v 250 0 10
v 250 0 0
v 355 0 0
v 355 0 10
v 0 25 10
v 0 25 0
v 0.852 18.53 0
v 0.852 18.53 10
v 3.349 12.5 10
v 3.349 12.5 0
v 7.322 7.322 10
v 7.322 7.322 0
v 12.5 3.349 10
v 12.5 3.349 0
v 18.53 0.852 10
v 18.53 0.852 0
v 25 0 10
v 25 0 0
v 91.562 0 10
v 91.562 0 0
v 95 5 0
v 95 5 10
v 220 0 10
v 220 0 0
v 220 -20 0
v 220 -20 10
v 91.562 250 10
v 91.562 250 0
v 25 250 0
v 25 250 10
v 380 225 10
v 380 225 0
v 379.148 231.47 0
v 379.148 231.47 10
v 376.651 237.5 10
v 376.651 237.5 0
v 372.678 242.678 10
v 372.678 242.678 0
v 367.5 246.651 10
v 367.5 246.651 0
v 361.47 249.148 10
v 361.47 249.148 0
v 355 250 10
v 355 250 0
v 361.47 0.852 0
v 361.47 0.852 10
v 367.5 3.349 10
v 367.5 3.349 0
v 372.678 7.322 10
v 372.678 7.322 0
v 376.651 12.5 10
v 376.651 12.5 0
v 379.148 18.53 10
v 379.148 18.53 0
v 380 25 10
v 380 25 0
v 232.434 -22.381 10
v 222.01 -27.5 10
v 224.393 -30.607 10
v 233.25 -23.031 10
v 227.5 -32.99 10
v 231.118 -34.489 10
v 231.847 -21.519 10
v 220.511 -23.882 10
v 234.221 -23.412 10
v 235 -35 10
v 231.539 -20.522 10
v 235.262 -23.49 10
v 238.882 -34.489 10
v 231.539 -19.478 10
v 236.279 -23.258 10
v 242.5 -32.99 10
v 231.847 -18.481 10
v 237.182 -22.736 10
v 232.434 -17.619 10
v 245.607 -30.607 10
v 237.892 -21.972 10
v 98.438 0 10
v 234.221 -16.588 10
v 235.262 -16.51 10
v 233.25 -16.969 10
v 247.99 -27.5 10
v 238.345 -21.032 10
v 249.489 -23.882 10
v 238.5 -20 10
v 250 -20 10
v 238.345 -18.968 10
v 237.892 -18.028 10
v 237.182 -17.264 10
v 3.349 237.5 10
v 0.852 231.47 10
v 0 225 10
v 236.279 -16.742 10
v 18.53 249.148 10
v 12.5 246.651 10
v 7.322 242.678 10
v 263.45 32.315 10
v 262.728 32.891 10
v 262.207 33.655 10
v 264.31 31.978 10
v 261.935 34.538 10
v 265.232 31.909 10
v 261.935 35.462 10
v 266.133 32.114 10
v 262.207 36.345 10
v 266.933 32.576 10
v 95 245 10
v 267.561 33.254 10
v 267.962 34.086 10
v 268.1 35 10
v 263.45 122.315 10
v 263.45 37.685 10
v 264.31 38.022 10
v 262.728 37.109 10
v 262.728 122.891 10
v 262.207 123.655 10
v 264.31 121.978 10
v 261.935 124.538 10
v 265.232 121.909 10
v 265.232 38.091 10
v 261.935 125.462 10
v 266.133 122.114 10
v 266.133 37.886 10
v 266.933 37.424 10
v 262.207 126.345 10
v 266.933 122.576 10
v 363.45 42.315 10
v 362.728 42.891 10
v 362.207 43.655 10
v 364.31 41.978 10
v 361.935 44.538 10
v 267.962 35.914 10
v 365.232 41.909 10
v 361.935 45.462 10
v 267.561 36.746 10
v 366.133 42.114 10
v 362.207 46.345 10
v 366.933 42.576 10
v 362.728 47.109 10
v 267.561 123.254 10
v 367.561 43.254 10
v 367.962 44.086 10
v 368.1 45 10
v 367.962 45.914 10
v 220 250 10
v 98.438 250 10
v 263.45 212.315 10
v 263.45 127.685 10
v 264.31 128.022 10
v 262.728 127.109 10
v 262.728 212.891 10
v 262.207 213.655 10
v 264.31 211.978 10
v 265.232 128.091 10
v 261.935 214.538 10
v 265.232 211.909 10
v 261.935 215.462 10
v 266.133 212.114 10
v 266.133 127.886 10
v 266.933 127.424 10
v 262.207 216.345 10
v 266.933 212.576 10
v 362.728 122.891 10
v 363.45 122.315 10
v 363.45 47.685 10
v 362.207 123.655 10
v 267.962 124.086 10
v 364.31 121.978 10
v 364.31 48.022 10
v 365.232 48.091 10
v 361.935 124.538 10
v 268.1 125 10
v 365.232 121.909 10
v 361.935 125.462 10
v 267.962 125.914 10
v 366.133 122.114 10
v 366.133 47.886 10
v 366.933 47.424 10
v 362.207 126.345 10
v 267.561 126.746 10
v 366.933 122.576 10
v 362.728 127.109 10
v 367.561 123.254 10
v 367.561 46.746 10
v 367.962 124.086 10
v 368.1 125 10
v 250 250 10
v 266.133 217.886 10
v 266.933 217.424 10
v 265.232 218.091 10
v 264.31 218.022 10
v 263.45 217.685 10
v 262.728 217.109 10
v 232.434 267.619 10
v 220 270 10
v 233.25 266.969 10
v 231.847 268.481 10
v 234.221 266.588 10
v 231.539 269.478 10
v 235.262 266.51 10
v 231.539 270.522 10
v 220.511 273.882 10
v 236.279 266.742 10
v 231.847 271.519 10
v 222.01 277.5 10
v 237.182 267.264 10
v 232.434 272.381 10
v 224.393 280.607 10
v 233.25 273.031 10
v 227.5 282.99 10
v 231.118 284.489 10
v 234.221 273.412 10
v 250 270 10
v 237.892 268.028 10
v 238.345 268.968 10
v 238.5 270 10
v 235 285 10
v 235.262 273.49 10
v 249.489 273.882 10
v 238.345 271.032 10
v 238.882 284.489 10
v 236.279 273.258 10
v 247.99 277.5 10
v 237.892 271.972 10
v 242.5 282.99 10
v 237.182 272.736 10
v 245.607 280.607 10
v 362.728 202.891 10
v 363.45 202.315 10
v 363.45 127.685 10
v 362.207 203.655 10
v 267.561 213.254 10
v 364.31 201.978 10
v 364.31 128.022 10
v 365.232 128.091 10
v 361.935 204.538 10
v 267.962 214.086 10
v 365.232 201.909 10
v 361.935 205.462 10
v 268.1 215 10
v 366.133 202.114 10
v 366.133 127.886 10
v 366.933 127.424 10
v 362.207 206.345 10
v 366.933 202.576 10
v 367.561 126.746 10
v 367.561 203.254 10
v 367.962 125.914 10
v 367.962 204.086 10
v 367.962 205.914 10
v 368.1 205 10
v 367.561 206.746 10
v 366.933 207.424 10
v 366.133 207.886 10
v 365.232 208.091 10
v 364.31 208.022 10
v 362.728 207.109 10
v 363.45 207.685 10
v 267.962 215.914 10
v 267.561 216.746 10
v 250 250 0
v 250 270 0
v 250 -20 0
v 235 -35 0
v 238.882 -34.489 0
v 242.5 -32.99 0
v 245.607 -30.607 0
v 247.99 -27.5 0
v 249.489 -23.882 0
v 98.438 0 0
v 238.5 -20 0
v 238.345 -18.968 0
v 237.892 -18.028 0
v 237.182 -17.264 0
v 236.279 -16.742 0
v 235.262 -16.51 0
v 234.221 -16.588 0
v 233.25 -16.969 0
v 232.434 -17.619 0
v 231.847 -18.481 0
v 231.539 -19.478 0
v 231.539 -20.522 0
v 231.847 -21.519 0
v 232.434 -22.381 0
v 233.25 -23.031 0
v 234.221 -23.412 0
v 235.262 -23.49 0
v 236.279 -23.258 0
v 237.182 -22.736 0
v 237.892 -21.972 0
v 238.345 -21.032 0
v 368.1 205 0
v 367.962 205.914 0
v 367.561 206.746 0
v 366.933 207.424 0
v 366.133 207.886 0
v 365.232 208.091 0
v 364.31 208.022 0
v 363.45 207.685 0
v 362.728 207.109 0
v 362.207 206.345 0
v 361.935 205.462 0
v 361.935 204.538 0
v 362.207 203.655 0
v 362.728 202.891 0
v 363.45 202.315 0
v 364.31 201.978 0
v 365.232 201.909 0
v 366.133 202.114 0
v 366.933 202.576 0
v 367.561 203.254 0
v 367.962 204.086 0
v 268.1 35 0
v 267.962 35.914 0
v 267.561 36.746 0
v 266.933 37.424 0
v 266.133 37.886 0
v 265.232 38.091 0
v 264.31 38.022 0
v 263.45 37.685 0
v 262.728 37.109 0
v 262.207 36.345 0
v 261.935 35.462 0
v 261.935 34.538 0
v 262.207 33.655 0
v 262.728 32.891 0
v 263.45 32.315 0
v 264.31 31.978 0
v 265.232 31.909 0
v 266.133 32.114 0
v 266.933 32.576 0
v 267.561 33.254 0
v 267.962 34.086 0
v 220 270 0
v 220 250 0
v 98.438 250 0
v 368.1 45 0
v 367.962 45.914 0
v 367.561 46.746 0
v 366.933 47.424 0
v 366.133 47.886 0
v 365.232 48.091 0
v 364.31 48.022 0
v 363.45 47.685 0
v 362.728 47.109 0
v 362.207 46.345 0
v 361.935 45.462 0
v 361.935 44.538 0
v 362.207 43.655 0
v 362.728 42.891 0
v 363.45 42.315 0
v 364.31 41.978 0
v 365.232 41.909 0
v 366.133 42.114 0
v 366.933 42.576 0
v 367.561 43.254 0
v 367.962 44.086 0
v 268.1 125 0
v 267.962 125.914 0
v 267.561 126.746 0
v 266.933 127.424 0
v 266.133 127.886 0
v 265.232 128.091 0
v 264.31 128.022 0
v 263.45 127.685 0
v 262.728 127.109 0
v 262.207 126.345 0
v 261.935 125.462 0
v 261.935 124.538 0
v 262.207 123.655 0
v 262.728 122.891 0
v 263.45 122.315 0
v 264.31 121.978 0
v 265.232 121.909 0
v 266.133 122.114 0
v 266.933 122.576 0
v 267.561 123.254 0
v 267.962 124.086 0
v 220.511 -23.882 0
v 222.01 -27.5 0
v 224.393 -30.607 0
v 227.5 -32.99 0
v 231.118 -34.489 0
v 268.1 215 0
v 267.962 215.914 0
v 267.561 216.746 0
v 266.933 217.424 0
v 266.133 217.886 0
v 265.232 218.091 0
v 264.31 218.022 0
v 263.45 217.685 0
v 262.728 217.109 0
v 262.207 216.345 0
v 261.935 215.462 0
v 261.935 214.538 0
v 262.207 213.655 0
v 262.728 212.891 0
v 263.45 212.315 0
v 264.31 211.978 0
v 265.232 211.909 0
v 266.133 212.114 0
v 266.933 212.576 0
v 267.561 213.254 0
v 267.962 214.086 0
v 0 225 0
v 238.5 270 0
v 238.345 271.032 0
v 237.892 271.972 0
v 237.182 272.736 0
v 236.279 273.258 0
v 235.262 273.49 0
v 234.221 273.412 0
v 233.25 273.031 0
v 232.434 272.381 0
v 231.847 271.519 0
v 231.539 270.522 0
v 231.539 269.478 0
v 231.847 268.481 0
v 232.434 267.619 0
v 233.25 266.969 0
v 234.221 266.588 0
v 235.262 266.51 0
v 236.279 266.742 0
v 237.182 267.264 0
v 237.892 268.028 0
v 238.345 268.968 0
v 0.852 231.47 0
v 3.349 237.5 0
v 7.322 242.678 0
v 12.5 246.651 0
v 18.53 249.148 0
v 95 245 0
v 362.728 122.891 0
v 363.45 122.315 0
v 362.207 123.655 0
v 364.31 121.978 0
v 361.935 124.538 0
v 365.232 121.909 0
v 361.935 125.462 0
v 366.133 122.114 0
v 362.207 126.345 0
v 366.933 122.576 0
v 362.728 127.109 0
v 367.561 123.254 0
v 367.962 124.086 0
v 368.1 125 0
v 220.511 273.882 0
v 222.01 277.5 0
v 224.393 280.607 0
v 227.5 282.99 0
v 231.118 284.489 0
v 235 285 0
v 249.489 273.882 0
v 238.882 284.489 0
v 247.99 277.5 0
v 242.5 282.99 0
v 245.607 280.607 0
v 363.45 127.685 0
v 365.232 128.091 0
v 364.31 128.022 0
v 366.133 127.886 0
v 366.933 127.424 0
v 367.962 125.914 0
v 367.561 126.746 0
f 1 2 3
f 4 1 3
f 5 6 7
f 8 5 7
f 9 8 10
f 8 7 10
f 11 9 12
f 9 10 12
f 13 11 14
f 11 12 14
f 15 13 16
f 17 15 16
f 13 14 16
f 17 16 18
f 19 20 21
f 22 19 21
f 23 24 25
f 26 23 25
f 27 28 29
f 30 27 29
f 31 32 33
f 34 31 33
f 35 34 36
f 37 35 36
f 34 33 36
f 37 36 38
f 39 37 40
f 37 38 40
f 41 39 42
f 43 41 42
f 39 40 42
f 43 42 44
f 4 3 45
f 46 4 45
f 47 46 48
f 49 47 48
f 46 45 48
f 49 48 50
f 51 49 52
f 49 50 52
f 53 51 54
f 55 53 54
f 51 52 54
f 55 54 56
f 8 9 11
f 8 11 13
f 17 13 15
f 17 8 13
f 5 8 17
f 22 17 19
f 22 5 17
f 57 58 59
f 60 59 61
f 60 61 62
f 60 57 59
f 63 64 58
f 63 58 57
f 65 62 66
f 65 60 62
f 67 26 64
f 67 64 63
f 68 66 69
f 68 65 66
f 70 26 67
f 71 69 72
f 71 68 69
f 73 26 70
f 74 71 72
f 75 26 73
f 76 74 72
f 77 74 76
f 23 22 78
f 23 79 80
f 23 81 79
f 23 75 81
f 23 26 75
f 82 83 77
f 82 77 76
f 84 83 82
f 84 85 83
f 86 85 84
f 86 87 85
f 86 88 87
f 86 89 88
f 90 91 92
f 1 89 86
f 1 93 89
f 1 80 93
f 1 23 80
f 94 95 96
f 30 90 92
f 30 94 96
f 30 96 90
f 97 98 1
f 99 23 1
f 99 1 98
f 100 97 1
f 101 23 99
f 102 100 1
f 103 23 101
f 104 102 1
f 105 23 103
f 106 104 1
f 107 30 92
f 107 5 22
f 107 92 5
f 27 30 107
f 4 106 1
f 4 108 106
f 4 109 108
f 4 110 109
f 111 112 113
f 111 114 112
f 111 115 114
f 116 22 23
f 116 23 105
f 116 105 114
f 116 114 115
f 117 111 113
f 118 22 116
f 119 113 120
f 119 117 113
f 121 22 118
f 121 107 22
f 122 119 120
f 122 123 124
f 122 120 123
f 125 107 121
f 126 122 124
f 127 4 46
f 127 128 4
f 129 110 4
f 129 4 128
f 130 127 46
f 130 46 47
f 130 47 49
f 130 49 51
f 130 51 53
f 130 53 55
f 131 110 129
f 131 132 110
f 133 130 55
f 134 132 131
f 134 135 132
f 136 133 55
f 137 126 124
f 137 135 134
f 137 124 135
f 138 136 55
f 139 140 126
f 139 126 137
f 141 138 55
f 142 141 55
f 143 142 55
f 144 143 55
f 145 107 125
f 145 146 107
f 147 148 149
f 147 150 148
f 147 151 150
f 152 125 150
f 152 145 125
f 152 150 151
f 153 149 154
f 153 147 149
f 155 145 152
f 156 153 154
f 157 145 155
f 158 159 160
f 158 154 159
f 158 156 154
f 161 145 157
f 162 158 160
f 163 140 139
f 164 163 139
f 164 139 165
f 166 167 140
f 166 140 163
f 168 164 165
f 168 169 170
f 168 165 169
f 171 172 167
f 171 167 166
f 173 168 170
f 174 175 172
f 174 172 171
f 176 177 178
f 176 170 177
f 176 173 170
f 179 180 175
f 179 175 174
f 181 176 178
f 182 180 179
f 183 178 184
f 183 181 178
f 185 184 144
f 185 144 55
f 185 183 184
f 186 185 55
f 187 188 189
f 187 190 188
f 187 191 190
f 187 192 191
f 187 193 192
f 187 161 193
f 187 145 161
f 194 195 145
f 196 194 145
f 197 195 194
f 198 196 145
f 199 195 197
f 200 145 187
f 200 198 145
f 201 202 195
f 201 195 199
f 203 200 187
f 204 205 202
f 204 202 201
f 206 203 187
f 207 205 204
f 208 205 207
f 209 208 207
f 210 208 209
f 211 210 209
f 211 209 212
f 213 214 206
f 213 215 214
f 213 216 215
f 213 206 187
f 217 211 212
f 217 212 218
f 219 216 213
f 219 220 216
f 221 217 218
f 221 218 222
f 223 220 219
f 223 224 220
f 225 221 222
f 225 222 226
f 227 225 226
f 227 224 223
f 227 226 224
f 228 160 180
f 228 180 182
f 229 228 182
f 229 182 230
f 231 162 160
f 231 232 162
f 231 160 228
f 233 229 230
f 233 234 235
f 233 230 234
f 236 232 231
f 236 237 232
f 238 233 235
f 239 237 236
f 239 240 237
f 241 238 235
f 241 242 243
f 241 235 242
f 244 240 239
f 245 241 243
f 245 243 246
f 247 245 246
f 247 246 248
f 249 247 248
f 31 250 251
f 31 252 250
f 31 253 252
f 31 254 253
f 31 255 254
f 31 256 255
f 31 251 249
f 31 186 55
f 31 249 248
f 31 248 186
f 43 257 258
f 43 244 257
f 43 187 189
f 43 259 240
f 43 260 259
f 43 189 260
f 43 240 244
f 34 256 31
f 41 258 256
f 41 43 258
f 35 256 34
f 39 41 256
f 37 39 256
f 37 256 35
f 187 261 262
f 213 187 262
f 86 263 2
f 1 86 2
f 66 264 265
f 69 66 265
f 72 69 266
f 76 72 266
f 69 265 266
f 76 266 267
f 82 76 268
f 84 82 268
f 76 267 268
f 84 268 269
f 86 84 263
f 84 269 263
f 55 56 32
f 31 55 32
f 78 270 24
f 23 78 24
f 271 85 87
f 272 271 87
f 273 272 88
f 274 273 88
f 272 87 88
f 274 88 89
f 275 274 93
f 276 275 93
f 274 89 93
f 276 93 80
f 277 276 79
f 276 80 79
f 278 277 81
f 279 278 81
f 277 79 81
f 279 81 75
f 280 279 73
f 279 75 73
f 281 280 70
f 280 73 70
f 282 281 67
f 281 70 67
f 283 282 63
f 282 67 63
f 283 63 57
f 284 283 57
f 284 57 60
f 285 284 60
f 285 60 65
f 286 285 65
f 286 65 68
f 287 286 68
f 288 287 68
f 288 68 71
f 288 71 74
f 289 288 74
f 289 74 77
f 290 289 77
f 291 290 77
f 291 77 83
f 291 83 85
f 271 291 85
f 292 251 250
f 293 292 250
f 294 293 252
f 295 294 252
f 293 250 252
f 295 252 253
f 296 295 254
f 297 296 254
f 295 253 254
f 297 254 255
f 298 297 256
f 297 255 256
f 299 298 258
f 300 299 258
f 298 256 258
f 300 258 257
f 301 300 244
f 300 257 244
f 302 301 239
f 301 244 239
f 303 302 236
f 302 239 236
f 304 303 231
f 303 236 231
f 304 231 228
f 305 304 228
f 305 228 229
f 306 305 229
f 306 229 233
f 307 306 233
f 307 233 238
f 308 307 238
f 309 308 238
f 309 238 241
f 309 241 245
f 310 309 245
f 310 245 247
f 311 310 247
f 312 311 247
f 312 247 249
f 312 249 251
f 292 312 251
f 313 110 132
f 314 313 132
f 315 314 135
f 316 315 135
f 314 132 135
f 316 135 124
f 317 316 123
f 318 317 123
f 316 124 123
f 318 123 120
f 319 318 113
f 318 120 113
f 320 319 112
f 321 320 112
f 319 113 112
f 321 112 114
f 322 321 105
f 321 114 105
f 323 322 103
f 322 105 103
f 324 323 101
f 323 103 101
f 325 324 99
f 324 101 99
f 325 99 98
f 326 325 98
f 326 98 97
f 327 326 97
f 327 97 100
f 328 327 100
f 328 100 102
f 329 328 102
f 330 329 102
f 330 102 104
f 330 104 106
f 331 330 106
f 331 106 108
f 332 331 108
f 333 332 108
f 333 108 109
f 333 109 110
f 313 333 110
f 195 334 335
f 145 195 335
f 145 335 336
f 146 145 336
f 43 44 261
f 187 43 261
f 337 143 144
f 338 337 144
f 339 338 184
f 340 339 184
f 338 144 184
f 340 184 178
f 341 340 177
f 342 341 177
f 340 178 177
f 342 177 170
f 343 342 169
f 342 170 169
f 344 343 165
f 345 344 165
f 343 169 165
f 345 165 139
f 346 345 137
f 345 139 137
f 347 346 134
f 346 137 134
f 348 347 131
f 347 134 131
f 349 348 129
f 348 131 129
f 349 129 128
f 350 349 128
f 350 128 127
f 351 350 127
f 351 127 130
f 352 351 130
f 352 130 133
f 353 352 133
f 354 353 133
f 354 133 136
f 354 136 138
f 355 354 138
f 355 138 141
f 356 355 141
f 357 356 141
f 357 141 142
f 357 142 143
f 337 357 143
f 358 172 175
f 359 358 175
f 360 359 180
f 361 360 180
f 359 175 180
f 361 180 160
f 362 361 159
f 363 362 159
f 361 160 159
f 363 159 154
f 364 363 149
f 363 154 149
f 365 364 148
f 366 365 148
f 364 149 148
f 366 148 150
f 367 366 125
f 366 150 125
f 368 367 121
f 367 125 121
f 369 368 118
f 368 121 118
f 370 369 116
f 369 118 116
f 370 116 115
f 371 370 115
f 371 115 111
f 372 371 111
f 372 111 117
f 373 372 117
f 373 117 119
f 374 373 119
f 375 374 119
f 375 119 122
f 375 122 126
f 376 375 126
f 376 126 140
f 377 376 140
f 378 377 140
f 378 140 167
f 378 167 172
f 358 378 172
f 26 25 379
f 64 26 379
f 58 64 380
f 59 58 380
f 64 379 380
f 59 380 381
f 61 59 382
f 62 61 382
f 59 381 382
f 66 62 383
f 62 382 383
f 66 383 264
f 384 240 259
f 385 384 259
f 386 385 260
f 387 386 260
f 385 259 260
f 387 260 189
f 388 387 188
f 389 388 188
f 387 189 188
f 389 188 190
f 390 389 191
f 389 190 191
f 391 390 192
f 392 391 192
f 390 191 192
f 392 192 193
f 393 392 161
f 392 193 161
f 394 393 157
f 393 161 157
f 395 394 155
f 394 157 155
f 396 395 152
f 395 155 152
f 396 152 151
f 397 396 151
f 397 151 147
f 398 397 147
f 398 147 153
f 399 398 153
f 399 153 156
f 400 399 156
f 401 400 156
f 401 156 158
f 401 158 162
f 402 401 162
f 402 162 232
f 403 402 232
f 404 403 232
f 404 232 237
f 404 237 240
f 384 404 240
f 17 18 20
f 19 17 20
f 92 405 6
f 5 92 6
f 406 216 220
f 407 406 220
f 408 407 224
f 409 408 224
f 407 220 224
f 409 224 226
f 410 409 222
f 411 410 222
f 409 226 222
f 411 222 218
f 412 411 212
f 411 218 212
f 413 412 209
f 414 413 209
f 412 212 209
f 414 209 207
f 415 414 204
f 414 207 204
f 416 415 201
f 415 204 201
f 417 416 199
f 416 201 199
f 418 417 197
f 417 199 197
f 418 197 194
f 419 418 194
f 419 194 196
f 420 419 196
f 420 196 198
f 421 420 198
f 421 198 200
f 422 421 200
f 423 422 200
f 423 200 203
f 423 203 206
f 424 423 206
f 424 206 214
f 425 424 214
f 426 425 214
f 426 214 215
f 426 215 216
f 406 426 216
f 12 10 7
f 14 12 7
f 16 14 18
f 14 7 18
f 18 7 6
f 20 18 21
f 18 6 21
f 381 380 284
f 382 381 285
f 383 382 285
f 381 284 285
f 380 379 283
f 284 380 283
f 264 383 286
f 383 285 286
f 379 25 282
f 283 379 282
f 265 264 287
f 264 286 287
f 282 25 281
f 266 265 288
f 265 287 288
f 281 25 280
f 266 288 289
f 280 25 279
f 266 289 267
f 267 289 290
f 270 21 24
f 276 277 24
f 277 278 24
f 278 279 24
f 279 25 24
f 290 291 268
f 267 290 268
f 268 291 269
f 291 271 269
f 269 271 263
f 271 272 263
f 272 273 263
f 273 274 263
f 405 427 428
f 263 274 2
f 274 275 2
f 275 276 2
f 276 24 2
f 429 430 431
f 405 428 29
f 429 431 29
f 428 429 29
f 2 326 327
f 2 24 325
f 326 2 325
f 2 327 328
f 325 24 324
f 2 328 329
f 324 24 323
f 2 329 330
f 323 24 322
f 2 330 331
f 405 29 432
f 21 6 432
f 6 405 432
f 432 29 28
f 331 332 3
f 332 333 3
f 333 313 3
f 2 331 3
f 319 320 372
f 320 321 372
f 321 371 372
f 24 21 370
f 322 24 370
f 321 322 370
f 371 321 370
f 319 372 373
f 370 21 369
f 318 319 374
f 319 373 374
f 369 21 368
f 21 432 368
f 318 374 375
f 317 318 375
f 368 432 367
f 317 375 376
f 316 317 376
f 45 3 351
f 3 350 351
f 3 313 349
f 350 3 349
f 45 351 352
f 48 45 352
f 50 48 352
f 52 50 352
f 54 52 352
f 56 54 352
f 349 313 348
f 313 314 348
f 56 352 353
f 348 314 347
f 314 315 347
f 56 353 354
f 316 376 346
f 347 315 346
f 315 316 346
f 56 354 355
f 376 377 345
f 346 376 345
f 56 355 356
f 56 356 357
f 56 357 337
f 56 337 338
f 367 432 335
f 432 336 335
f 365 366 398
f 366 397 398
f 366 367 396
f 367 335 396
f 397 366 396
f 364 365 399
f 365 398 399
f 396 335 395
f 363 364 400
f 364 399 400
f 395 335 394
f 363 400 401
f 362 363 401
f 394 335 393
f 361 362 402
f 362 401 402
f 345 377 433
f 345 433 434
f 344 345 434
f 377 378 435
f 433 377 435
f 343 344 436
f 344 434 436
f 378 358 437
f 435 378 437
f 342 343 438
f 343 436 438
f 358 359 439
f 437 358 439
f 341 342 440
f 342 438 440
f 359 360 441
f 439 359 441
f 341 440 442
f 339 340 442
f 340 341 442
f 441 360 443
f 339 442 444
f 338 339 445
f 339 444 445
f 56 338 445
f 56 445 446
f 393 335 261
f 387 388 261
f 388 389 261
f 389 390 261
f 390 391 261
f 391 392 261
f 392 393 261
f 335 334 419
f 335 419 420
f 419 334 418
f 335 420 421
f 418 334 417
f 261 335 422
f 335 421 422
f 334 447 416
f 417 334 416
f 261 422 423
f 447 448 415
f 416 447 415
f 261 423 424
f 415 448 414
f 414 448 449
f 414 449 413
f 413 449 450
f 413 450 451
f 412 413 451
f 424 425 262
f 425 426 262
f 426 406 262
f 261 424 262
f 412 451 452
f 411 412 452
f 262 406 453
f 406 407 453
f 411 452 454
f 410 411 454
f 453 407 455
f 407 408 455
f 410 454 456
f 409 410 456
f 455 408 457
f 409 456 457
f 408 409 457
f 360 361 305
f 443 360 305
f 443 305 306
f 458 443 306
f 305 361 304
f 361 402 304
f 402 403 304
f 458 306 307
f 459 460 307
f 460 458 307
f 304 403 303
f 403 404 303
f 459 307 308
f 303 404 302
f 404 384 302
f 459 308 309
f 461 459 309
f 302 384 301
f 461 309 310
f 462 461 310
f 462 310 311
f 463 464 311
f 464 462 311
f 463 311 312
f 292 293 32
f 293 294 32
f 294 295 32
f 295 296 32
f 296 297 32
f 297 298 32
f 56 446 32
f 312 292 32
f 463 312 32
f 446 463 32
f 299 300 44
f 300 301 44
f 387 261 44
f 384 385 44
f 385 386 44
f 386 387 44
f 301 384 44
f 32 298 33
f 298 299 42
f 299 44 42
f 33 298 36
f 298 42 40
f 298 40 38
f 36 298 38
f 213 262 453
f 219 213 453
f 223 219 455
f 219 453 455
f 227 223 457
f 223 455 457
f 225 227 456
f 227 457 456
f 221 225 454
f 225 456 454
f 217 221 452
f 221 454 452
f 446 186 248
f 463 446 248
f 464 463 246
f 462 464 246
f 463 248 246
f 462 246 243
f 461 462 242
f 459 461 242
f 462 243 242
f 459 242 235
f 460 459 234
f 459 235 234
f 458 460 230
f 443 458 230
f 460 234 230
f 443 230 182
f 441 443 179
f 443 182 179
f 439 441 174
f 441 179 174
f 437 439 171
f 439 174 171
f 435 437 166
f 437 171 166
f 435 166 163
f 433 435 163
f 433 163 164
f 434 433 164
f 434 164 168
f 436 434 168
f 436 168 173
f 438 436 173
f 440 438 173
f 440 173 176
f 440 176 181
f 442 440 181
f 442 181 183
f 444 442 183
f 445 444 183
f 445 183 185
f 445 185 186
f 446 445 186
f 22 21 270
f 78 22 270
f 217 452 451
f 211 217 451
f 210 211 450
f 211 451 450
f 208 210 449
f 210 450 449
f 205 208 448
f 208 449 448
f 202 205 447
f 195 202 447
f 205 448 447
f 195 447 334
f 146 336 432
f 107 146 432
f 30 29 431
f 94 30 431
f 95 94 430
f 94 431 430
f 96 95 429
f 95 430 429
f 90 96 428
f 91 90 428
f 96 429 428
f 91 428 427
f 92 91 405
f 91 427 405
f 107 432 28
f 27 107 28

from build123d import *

# Parameters (mm, degrees)
F1_DEPTH = 10
F2_R     = 3.5
F3_DEPTH = 25
F4_R     = 3.1
F5_DEPTH = 25


with BuildPart() as f1:
    # F0 (on Top) → F1 (new body)
    with BuildSketch(Plane.XY):
        with BuildLine():
            ThreePointArc((0, 25), (7.32233, 7.32233), (25, 0))
            Line((25, 0), (91.562498, 0))
            Line((91.562498, 0), (95, 5))
            Line((95, 5), (98.437502, 0))
            Line((98.437502, 0), (220, 0))
            Line((220, 0), (220, -20))
            ThreePointArc((220, -20), (224.393398, -30.606602), (235, -35))
            ThreePointArc((235, -35), (245.606602, -30.606602), (250, -20))
            Line((250, -20), (250, 0))
            Line((250, 0), (355, 0))
            ThreePointArc((355, 0), (372.67767, 7.32233), (380, 25))
            Line((380, 25), (380, 225))
            ThreePointArc((380, 225), (372.67767, 242.67767), (355, 250))
            Line((355, 250), (250, 250))
            Line((250, 250), (250, 270))
            ThreePointArc((250, 270), (245.606602, 280.606602), (235, 285))
            ThreePointArc((235, 285), (224.393398, 280.606602), (220, 270))
            Line((220, 270), (220, 250))
            Line((220, 250), (98.437502, 250))
            Line((98.437502, 250), (95, 245))
            Line((95, 245), (91.562498, 250))
            Line((91.562498, 250), (25, 250))
            ThreePointArc((25, 250), (7.32233, 242.67767), (0, 225))
            Line((0, 225), (0, 25))
        make_face()
    extrude(amount=F1_DEPTH)

    # F2 (on face) → F3 (cut)
    with BuildSketch(Plane.XY.offset(10)):
        with Locations((235, -20)):
            Circle(F2_R)
        with Locations((235, 270)):
            Circle(F2_R)
    extrude(amount=-F3_DEPTH, mode=Mode.SUBTRACT)

    # F4 (on face) → F5 (cut)
    with BuildSketch(Plane.XY.offset(10)):
        with Locations((265, 215)):
            Circle(F4_R)
        with Locations((265, 125)):
            Circle(F4_R)
        with Locations((265, 35)):
            Circle(F4_R)
        with Locations((365, 45)):
            Circle(F4_R)
        with Locations((365, 125)):
            Circle(F4_R)
        with Locations((365, 205)):
            Circle(F4_R)
    extrude(amount=-F5_DEPTH, mode=Mode.SUBTRACT)


solid = f1.part
